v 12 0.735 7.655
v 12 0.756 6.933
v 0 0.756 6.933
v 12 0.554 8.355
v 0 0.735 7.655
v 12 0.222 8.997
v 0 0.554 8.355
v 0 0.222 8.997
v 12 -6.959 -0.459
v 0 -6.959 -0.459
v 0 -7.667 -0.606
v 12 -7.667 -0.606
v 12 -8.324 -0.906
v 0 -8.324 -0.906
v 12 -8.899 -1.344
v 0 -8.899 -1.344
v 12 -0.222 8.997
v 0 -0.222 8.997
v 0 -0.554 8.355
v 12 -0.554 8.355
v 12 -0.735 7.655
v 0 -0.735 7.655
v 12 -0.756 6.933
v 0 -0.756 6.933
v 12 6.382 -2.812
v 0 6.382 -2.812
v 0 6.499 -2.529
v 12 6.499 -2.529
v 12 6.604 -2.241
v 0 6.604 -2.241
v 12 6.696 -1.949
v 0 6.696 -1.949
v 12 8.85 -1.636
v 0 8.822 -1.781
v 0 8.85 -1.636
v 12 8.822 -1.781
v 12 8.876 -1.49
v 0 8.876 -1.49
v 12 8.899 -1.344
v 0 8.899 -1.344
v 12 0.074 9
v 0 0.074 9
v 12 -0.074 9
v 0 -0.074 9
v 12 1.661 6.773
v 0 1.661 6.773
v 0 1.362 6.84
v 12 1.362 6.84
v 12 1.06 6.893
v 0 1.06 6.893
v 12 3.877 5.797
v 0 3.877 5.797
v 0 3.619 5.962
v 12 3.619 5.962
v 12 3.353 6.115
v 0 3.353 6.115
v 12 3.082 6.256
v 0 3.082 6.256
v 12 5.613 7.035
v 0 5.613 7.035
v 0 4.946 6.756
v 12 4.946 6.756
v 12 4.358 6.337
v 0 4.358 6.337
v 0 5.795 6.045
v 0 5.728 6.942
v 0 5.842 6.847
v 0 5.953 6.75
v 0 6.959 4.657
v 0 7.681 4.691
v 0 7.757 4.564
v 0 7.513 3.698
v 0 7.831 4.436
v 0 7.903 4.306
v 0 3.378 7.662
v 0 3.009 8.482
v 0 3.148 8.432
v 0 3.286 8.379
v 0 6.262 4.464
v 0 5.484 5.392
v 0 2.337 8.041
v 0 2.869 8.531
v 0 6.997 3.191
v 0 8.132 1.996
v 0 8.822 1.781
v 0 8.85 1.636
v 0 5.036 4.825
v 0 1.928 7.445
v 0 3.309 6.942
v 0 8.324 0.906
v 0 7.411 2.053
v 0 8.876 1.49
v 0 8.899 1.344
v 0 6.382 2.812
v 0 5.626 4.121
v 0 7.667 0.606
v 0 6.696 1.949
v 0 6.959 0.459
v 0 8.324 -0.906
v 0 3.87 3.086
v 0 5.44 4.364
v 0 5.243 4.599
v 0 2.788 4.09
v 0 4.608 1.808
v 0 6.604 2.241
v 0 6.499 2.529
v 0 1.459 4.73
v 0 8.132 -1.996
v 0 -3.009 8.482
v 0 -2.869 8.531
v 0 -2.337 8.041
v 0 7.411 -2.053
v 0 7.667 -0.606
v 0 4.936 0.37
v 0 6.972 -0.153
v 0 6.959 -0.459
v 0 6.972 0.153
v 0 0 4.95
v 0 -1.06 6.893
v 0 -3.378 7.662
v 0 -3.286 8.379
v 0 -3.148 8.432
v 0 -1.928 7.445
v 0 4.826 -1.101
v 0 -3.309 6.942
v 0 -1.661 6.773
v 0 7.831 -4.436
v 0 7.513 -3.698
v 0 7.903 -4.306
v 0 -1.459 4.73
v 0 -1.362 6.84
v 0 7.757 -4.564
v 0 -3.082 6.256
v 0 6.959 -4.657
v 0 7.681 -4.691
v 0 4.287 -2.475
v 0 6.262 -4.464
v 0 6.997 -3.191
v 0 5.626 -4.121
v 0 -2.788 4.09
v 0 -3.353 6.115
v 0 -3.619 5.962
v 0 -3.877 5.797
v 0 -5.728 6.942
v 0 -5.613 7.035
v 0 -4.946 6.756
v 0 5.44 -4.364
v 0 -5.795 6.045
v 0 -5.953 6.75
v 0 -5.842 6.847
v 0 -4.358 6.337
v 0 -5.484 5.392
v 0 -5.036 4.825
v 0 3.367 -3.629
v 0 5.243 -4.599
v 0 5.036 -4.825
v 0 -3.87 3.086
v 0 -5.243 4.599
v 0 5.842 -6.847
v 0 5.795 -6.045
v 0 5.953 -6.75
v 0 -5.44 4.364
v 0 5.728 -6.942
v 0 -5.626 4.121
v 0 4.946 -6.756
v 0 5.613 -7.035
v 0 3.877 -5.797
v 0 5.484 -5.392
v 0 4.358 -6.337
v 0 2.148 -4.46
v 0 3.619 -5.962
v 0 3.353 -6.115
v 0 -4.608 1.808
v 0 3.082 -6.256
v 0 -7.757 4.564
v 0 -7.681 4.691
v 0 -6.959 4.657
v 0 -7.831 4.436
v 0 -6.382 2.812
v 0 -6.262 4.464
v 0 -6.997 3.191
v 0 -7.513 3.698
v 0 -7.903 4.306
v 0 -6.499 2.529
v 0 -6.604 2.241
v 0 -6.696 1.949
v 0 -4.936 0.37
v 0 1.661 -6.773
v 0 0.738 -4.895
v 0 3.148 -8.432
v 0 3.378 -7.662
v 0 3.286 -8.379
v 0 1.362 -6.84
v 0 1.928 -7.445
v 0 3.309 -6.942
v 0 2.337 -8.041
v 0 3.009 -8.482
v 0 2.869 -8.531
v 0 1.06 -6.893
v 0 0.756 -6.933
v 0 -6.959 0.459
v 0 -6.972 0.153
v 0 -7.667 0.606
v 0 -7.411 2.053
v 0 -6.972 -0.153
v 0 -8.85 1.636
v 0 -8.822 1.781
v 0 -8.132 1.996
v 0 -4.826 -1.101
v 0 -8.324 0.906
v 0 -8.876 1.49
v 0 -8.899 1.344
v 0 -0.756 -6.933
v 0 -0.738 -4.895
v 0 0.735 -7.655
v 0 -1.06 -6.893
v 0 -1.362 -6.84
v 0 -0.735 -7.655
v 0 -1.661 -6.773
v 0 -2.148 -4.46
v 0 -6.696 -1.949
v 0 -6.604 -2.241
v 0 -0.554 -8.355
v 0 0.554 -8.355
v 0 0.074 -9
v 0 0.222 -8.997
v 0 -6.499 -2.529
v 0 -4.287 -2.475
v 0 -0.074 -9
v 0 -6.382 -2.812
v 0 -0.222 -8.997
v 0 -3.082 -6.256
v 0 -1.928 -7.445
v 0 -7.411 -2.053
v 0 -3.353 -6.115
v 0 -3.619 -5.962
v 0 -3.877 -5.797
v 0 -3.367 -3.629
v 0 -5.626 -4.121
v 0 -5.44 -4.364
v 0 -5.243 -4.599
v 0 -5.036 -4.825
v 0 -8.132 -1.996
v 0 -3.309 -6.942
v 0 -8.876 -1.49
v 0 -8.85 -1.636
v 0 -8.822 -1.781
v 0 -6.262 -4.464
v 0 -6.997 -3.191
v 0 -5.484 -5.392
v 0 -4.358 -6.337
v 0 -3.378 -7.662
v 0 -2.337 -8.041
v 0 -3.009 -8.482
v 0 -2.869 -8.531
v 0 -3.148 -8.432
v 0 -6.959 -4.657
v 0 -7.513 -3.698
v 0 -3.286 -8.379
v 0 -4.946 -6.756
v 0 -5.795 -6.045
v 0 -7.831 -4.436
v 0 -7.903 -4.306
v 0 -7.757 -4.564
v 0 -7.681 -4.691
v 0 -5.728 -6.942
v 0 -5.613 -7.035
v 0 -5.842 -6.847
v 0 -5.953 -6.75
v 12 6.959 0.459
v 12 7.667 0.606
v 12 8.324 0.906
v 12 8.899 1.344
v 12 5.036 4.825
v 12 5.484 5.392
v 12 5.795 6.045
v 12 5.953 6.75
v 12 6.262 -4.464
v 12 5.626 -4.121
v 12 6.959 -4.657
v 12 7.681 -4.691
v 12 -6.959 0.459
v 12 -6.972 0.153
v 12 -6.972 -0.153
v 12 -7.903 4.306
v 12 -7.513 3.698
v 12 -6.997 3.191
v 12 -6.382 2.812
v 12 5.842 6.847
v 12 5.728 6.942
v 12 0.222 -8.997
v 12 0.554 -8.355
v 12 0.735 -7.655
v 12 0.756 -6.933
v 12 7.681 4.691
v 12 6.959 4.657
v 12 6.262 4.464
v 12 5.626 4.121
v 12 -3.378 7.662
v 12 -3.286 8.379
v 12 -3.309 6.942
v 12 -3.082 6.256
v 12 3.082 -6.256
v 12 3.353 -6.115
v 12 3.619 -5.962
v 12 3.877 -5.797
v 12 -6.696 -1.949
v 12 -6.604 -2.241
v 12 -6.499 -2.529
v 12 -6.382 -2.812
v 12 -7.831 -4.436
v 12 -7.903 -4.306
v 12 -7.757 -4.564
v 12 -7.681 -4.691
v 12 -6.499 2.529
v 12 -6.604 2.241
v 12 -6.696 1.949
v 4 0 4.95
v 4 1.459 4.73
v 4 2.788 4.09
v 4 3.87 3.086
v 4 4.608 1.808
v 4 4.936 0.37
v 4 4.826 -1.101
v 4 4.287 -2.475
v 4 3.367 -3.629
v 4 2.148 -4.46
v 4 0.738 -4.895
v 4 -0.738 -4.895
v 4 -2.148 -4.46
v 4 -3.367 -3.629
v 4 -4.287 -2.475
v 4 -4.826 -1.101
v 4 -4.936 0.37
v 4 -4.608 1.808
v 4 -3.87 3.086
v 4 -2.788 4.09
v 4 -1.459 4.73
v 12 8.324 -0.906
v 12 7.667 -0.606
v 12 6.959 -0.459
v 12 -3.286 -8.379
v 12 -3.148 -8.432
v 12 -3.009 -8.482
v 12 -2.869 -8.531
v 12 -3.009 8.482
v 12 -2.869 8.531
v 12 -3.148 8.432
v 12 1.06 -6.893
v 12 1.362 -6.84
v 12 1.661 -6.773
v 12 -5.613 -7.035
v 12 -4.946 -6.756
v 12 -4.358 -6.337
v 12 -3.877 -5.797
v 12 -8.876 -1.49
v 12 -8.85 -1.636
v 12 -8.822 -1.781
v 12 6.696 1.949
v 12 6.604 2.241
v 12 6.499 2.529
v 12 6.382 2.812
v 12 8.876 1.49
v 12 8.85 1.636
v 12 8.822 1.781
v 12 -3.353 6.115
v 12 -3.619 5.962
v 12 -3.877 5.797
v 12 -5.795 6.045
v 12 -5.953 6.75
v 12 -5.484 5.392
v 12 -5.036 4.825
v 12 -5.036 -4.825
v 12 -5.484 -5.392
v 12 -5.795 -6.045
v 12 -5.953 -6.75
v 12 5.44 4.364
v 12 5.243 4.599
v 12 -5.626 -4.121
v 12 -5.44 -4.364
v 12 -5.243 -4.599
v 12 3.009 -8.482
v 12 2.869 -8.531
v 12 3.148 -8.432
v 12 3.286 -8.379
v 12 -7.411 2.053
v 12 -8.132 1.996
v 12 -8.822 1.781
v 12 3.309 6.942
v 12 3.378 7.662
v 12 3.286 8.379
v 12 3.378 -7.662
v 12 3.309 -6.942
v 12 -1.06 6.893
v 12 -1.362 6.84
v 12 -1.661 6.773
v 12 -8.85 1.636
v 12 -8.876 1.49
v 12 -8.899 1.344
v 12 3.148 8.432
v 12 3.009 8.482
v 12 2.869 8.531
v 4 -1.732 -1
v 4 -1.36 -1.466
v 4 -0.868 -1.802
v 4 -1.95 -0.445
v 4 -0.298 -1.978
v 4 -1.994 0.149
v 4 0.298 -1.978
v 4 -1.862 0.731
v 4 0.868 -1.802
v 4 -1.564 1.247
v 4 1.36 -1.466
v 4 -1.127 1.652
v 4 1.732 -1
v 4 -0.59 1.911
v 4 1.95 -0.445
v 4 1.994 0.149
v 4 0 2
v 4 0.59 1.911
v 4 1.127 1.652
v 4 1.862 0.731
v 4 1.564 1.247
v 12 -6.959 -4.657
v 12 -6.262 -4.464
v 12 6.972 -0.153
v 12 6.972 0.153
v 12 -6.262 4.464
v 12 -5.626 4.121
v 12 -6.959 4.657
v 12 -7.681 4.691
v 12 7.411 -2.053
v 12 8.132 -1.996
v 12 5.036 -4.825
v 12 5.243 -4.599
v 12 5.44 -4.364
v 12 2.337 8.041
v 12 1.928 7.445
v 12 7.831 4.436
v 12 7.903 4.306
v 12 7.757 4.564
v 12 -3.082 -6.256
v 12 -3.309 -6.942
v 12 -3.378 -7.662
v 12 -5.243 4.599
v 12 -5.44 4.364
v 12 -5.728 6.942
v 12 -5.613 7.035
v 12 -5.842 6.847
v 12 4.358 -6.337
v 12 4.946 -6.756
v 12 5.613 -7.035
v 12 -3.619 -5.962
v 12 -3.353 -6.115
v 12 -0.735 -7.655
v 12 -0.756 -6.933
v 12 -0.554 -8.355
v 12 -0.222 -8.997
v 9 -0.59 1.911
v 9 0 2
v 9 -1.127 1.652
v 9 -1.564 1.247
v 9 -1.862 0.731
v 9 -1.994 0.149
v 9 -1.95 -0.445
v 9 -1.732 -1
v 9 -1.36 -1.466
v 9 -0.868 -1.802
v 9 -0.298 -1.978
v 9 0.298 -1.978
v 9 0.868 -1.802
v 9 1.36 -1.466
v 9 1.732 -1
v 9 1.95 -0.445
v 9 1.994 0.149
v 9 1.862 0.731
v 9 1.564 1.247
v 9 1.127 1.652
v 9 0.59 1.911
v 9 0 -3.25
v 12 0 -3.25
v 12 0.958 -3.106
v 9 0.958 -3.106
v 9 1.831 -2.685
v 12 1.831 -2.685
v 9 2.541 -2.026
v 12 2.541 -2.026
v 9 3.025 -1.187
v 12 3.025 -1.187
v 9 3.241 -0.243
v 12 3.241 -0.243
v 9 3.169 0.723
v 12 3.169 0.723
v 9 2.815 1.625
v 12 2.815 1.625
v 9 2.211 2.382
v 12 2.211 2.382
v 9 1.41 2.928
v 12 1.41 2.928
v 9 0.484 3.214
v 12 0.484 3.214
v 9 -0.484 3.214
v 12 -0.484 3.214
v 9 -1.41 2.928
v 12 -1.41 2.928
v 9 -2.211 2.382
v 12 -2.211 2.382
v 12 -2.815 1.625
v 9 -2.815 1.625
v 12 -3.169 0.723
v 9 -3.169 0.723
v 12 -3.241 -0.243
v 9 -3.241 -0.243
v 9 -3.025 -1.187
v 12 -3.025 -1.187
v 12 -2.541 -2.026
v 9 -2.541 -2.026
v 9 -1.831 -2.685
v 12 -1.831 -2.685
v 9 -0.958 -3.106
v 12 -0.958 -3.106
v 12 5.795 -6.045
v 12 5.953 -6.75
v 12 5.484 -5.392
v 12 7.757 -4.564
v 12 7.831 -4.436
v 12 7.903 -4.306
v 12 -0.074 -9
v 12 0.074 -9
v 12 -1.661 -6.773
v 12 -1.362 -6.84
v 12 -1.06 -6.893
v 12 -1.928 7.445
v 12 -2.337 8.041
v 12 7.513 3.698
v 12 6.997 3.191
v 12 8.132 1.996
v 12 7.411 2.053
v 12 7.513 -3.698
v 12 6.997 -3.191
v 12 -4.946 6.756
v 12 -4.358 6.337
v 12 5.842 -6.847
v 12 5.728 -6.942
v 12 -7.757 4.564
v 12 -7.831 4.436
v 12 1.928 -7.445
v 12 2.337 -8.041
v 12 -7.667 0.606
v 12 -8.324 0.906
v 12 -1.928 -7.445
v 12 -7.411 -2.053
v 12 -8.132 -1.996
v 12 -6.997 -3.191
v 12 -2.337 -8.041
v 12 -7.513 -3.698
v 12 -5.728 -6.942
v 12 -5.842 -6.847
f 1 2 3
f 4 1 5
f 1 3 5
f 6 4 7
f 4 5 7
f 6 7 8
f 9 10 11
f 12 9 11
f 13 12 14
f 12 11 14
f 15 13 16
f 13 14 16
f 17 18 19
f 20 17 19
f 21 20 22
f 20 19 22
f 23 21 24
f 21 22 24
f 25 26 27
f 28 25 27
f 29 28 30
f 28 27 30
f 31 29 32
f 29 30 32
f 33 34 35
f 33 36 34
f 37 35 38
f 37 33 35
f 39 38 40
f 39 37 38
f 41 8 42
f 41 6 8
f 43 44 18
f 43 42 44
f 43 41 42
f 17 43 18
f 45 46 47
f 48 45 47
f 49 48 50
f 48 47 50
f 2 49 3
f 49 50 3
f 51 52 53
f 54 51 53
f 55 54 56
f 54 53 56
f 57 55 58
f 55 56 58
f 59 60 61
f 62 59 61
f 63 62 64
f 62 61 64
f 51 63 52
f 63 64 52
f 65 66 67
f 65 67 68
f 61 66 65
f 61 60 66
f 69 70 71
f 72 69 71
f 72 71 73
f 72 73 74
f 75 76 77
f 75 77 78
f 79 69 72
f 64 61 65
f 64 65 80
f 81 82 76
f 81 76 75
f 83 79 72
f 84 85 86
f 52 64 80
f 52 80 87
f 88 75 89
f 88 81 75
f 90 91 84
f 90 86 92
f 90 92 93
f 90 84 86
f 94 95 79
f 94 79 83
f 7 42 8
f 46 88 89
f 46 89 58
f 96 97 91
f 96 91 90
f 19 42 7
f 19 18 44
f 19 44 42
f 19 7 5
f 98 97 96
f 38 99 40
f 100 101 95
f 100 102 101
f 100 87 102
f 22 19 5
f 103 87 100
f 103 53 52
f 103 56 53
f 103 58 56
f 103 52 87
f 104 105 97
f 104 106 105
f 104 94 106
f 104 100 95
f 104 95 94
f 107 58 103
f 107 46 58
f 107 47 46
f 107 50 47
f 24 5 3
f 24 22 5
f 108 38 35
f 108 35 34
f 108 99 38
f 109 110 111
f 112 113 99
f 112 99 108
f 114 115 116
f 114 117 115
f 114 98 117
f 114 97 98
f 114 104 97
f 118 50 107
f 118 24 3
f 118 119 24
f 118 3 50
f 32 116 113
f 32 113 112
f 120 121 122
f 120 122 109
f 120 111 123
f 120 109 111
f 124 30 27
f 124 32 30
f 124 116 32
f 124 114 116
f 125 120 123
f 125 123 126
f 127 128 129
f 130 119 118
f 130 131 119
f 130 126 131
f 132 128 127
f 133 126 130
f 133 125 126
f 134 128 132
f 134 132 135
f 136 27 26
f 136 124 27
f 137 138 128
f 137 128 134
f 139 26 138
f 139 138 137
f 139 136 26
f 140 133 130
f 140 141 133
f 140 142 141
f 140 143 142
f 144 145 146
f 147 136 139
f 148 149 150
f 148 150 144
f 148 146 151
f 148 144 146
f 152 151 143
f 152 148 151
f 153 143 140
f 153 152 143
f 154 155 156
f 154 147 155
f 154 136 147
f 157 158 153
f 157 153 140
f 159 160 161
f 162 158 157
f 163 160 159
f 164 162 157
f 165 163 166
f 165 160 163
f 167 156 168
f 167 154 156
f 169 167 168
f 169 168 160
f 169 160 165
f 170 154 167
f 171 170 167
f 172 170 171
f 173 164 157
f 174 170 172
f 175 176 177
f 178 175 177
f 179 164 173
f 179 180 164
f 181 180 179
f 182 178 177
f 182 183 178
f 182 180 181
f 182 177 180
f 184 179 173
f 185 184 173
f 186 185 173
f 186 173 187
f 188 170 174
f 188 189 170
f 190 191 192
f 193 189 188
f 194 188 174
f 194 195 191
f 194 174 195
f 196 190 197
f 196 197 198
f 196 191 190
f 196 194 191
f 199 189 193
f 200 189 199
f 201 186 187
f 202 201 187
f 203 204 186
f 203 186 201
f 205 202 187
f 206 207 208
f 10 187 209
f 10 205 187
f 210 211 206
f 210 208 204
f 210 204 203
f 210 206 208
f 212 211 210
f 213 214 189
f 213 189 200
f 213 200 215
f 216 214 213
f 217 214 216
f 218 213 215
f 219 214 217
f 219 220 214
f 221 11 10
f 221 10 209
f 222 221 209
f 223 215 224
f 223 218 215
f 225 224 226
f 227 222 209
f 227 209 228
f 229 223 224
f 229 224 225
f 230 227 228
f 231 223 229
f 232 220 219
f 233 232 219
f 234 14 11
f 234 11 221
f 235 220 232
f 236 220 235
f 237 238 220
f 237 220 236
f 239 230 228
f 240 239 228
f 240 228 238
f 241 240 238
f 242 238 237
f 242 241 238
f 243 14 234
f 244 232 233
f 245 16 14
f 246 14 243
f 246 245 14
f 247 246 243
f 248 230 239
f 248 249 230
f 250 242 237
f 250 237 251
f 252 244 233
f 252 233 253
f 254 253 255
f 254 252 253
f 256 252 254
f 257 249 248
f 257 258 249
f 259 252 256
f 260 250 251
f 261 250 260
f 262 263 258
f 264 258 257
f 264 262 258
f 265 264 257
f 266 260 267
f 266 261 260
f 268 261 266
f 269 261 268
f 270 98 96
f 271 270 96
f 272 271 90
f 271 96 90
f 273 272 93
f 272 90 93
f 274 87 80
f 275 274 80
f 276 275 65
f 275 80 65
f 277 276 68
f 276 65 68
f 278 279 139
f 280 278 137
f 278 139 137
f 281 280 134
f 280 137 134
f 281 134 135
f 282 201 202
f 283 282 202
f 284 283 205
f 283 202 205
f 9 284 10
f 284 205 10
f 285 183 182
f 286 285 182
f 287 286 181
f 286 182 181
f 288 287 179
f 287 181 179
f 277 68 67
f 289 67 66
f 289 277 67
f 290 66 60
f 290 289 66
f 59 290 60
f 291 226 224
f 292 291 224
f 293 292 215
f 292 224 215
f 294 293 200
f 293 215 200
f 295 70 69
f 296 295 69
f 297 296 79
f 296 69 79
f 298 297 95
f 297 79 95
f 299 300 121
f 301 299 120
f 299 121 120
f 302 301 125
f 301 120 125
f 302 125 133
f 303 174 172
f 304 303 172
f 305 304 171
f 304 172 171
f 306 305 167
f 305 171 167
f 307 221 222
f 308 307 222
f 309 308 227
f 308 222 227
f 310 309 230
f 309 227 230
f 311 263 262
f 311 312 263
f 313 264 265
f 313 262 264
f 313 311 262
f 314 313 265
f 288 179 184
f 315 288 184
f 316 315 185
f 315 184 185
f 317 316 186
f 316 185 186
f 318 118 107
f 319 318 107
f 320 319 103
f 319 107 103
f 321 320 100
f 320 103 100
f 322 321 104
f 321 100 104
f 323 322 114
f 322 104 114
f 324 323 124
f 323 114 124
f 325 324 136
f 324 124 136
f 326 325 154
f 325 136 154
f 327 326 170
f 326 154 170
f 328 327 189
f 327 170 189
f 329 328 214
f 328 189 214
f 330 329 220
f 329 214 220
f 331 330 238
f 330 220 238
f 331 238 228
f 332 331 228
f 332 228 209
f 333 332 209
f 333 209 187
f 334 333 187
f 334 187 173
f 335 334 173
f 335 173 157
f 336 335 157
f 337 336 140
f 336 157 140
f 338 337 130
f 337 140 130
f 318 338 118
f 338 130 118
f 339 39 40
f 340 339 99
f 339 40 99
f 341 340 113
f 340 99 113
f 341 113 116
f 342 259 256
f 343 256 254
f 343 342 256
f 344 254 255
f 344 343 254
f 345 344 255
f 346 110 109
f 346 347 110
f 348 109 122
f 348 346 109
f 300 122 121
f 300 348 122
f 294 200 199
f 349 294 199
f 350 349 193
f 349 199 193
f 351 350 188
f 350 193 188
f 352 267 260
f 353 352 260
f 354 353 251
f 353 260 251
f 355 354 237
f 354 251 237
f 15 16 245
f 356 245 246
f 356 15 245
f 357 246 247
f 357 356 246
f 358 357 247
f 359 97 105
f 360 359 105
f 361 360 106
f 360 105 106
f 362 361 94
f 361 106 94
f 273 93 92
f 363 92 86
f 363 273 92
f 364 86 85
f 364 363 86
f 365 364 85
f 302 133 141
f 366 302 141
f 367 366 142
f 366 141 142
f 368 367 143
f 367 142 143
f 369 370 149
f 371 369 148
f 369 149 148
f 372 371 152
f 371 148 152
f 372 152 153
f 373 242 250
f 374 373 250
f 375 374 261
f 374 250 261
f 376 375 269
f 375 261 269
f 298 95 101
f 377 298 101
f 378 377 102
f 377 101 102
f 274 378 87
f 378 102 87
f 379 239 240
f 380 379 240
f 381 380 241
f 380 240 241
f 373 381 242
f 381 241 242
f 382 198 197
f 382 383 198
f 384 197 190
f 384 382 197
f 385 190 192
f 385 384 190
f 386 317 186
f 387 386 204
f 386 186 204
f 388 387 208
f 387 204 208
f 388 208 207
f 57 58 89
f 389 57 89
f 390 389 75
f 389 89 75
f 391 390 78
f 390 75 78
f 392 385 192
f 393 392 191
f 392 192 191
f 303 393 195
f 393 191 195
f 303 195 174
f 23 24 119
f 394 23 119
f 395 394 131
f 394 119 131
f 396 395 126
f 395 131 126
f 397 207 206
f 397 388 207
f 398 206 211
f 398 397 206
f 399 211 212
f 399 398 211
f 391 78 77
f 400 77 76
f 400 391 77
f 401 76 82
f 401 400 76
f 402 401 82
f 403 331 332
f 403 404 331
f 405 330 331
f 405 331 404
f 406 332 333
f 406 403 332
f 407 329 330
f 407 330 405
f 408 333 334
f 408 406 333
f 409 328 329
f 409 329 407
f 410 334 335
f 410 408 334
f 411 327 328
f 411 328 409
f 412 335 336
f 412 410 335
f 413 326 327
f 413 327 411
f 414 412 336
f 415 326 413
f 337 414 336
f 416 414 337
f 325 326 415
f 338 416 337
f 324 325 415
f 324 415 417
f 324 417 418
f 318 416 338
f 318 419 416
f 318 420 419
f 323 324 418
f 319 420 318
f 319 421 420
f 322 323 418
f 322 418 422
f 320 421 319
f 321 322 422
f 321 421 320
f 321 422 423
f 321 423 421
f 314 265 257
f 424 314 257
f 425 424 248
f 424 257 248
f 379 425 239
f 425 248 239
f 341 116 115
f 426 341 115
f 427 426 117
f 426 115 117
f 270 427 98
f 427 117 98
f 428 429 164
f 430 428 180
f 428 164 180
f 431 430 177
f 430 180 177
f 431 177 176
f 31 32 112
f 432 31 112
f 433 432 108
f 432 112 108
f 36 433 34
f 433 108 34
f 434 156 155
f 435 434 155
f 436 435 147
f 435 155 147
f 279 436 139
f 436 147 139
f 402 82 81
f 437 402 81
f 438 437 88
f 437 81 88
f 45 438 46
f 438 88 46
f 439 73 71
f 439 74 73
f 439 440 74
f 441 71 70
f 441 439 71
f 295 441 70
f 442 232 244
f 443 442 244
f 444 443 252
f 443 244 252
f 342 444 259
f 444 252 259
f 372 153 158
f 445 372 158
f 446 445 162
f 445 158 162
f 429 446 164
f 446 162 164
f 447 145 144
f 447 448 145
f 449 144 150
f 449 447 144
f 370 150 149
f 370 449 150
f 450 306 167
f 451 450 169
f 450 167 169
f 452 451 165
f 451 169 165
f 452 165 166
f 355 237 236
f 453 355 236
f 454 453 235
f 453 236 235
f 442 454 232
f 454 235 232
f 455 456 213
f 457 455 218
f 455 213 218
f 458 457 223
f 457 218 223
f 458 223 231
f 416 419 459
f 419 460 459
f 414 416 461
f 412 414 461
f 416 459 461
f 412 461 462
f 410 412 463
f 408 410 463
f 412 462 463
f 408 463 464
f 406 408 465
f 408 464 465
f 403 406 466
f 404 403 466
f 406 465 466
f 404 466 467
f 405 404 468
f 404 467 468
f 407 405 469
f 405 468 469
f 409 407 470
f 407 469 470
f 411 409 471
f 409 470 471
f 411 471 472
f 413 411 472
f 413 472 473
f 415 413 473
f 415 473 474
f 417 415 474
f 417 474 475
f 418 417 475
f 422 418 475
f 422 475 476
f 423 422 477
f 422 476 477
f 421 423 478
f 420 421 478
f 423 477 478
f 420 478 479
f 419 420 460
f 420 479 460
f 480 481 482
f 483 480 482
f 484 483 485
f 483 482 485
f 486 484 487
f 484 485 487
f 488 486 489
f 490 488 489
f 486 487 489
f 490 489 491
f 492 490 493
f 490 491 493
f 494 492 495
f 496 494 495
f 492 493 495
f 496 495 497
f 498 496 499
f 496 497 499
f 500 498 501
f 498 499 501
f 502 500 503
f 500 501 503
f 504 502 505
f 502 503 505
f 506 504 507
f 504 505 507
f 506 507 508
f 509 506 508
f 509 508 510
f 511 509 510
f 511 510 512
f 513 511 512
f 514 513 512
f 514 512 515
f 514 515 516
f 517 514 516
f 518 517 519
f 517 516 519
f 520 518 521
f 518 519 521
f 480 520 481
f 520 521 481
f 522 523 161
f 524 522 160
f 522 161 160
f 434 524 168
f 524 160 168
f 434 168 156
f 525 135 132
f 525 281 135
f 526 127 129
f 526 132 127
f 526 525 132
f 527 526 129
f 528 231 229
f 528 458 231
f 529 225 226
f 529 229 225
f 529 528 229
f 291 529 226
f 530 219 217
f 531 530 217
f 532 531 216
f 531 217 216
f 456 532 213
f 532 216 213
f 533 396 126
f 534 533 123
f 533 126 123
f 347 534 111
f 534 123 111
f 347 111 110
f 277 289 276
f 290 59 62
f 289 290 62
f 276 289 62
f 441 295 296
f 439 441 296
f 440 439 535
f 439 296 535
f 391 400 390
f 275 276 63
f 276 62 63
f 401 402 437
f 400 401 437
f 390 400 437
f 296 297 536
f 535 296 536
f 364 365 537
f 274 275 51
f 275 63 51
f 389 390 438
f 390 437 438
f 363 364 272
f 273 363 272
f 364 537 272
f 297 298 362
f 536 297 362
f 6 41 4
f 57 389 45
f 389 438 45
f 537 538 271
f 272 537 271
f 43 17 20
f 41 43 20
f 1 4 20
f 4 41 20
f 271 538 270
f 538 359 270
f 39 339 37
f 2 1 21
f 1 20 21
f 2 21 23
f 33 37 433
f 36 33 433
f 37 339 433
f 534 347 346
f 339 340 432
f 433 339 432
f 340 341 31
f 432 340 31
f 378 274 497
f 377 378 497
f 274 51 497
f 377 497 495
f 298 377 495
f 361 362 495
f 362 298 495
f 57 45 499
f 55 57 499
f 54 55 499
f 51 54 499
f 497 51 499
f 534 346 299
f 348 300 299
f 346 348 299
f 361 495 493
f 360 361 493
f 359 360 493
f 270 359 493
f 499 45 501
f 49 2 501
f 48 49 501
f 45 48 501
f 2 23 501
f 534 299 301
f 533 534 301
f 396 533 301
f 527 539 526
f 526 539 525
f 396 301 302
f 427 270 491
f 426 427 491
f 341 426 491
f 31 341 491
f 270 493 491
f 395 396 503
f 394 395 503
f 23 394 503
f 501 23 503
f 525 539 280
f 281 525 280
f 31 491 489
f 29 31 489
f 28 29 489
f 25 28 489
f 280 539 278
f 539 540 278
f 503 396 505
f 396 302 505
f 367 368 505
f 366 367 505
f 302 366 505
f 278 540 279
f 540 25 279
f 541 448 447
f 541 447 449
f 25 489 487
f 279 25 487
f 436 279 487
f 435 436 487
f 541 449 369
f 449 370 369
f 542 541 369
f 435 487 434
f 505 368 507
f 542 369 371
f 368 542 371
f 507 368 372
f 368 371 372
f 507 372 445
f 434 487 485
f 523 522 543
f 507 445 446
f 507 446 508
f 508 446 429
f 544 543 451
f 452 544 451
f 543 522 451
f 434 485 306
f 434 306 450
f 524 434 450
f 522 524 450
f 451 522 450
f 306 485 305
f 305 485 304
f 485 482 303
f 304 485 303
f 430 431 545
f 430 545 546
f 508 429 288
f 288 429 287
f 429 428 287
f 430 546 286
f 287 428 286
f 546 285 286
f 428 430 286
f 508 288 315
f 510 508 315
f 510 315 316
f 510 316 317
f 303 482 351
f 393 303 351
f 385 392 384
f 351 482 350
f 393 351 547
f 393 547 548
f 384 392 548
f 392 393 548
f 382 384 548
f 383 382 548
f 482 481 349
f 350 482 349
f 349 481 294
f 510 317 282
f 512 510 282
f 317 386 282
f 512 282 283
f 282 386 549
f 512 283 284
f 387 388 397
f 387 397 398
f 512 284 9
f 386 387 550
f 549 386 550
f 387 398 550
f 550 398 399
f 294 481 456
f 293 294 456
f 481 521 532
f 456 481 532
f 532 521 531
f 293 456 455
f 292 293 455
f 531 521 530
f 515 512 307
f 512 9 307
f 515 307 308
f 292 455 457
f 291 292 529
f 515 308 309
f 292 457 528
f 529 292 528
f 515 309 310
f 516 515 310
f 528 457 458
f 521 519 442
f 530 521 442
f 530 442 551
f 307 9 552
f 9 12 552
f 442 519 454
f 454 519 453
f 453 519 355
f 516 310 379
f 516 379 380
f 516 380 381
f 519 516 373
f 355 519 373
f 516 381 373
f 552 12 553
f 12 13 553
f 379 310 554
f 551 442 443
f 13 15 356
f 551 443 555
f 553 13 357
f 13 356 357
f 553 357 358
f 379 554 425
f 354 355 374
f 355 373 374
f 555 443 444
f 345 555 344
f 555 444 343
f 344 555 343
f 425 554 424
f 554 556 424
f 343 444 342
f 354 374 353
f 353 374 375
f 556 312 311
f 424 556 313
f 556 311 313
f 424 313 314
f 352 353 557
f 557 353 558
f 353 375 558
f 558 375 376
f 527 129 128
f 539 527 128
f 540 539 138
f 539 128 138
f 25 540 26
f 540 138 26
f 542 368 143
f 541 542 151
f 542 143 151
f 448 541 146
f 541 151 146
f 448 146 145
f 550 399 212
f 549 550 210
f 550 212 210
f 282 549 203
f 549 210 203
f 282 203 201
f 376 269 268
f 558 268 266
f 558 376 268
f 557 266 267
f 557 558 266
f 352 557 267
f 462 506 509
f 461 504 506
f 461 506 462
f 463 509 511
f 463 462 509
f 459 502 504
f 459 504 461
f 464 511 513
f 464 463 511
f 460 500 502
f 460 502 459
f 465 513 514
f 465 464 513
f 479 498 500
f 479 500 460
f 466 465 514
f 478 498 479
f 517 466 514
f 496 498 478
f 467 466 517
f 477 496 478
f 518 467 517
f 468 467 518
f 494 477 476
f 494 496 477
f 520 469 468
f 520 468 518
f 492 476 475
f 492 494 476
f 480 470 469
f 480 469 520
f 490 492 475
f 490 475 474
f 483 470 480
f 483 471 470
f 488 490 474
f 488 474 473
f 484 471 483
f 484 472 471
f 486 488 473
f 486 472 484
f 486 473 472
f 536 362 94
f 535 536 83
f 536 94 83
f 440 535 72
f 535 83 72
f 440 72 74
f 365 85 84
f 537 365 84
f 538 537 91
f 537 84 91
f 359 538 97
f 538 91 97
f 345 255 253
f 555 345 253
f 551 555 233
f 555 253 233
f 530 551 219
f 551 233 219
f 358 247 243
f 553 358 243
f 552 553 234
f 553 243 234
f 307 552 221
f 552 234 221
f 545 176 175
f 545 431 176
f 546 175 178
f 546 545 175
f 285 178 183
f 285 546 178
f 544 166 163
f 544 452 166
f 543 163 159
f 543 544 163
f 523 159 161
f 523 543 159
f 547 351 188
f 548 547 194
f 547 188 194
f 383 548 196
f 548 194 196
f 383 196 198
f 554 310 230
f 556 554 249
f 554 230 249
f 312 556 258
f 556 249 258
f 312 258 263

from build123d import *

# Parameters (mm, degrees)
BASPROSKE_W        = 12
BASPROSKE_H        = 9
TOOTHCUT_DEPTH     = 18.492855685
TEETHCUTS_COUNT    = 18
TEETHCUTS_ANGLE    = 340
BORSKE_R           = 2
BORE_DEPTH         = 50.0000508
SKETCH2_R          = 3.25
CUT_EXTRUDE1_DEPTH = 3
SKETCH3_R          = 4.95
CUT_EXTRUDE2_DEPTH = 4


with BuildPart() as part:
    # BasProSke → Base-Revolve (revolve)
    with BuildSketch(Plane(origin=(0, 0, 0), x_dir=(1, 0, 0), z_dir=(0, 1, 0)), mode=Mode.PRIVATE) as base_revolve_sk:
        with Locations((6, 4.5)):
            Rectangle(BASPROSKE_W, BASPROSKE_H)
    revolve(base_revolve_sk.sketch.rotate(Axis((-10, 0, 0), (1, 0, 0)), 180), axis=Axis((-10, 0, 0), (1, 0, 0)))

    # TooCutSke → ToothCut (cut, through all)
    with BuildSketch(Plane(origin=(0, 0, 0), x_dir=(0, 0, -1), z_dir=(1, 0, 0))):
        with BuildLine():
            ThreePointArc((0.45926649, 6.958861278), (0, 6.974), (-0.45926649, 6.958861278))
            ThreePointArc((-0.45926649, 6.958861278), (-0.743858876, 8.01799277), (-1.365479267, 8.921508366))
            ThreePointArc((-1.365479267, 8.921508366), (0, 9.0254), (1.365479267, 8.921508366))
            ThreePointArc((1.365479267, 8.921508366), (0.743858876, 8.01799277), (0.45926649, 6.958861278))
        make_face()
    toothcut = extrude(amount=TOOTHCUT_DEPTH, mode=Mode.SUBTRACT)

    # TeethCuts: ToothCut ×18 about axis
    teethcuts_axis = Axis((-10, 0, 0), (1, 0, 0))
    for i in range(1, TEETHCUTS_COUNT):
        add(toothcut.rotate(teethcuts_axis, i * TEETHCUTS_ANGLE / (TEETHCUTS_COUNT - 1)), mode=Mode.SUBTRACT)

    # BorSke → Bore (cut, symmetric)
    with BuildSketch(Plane(origin=(0, 0, 0), x_dir=(0, 0, -1), z_dir=(1, 0, 0))):
        with Locations(Location((0, 0, 0), (0, 0, 180))):
            Circle(BORSKE_R)
    extrude(amount=BORE_DEPTH, both=True, mode=Mode.SUBTRACT)

    # Sketch2 → Cut-Extrude1 (cut)
    with BuildSketch(Plane(origin=(12, 0, 0), x_dir=(0, 0, -1), z_dir=(1, 0, 0))):
        Circle(SKETCH2_R)
    extrude(amount=-CUT_EXTRUDE1_DEPTH, mode=Mode.SUBTRACT)

    # Sketch3 → Cut-Extrude2 (cut)
    with BuildSketch(Plane.ZY):
        Circle(SKETCH3_R)
    extrude(amount=-CUT_EXTRUDE2_DEPTH, mode=Mode.SUBTRACT)


solid = part.part
